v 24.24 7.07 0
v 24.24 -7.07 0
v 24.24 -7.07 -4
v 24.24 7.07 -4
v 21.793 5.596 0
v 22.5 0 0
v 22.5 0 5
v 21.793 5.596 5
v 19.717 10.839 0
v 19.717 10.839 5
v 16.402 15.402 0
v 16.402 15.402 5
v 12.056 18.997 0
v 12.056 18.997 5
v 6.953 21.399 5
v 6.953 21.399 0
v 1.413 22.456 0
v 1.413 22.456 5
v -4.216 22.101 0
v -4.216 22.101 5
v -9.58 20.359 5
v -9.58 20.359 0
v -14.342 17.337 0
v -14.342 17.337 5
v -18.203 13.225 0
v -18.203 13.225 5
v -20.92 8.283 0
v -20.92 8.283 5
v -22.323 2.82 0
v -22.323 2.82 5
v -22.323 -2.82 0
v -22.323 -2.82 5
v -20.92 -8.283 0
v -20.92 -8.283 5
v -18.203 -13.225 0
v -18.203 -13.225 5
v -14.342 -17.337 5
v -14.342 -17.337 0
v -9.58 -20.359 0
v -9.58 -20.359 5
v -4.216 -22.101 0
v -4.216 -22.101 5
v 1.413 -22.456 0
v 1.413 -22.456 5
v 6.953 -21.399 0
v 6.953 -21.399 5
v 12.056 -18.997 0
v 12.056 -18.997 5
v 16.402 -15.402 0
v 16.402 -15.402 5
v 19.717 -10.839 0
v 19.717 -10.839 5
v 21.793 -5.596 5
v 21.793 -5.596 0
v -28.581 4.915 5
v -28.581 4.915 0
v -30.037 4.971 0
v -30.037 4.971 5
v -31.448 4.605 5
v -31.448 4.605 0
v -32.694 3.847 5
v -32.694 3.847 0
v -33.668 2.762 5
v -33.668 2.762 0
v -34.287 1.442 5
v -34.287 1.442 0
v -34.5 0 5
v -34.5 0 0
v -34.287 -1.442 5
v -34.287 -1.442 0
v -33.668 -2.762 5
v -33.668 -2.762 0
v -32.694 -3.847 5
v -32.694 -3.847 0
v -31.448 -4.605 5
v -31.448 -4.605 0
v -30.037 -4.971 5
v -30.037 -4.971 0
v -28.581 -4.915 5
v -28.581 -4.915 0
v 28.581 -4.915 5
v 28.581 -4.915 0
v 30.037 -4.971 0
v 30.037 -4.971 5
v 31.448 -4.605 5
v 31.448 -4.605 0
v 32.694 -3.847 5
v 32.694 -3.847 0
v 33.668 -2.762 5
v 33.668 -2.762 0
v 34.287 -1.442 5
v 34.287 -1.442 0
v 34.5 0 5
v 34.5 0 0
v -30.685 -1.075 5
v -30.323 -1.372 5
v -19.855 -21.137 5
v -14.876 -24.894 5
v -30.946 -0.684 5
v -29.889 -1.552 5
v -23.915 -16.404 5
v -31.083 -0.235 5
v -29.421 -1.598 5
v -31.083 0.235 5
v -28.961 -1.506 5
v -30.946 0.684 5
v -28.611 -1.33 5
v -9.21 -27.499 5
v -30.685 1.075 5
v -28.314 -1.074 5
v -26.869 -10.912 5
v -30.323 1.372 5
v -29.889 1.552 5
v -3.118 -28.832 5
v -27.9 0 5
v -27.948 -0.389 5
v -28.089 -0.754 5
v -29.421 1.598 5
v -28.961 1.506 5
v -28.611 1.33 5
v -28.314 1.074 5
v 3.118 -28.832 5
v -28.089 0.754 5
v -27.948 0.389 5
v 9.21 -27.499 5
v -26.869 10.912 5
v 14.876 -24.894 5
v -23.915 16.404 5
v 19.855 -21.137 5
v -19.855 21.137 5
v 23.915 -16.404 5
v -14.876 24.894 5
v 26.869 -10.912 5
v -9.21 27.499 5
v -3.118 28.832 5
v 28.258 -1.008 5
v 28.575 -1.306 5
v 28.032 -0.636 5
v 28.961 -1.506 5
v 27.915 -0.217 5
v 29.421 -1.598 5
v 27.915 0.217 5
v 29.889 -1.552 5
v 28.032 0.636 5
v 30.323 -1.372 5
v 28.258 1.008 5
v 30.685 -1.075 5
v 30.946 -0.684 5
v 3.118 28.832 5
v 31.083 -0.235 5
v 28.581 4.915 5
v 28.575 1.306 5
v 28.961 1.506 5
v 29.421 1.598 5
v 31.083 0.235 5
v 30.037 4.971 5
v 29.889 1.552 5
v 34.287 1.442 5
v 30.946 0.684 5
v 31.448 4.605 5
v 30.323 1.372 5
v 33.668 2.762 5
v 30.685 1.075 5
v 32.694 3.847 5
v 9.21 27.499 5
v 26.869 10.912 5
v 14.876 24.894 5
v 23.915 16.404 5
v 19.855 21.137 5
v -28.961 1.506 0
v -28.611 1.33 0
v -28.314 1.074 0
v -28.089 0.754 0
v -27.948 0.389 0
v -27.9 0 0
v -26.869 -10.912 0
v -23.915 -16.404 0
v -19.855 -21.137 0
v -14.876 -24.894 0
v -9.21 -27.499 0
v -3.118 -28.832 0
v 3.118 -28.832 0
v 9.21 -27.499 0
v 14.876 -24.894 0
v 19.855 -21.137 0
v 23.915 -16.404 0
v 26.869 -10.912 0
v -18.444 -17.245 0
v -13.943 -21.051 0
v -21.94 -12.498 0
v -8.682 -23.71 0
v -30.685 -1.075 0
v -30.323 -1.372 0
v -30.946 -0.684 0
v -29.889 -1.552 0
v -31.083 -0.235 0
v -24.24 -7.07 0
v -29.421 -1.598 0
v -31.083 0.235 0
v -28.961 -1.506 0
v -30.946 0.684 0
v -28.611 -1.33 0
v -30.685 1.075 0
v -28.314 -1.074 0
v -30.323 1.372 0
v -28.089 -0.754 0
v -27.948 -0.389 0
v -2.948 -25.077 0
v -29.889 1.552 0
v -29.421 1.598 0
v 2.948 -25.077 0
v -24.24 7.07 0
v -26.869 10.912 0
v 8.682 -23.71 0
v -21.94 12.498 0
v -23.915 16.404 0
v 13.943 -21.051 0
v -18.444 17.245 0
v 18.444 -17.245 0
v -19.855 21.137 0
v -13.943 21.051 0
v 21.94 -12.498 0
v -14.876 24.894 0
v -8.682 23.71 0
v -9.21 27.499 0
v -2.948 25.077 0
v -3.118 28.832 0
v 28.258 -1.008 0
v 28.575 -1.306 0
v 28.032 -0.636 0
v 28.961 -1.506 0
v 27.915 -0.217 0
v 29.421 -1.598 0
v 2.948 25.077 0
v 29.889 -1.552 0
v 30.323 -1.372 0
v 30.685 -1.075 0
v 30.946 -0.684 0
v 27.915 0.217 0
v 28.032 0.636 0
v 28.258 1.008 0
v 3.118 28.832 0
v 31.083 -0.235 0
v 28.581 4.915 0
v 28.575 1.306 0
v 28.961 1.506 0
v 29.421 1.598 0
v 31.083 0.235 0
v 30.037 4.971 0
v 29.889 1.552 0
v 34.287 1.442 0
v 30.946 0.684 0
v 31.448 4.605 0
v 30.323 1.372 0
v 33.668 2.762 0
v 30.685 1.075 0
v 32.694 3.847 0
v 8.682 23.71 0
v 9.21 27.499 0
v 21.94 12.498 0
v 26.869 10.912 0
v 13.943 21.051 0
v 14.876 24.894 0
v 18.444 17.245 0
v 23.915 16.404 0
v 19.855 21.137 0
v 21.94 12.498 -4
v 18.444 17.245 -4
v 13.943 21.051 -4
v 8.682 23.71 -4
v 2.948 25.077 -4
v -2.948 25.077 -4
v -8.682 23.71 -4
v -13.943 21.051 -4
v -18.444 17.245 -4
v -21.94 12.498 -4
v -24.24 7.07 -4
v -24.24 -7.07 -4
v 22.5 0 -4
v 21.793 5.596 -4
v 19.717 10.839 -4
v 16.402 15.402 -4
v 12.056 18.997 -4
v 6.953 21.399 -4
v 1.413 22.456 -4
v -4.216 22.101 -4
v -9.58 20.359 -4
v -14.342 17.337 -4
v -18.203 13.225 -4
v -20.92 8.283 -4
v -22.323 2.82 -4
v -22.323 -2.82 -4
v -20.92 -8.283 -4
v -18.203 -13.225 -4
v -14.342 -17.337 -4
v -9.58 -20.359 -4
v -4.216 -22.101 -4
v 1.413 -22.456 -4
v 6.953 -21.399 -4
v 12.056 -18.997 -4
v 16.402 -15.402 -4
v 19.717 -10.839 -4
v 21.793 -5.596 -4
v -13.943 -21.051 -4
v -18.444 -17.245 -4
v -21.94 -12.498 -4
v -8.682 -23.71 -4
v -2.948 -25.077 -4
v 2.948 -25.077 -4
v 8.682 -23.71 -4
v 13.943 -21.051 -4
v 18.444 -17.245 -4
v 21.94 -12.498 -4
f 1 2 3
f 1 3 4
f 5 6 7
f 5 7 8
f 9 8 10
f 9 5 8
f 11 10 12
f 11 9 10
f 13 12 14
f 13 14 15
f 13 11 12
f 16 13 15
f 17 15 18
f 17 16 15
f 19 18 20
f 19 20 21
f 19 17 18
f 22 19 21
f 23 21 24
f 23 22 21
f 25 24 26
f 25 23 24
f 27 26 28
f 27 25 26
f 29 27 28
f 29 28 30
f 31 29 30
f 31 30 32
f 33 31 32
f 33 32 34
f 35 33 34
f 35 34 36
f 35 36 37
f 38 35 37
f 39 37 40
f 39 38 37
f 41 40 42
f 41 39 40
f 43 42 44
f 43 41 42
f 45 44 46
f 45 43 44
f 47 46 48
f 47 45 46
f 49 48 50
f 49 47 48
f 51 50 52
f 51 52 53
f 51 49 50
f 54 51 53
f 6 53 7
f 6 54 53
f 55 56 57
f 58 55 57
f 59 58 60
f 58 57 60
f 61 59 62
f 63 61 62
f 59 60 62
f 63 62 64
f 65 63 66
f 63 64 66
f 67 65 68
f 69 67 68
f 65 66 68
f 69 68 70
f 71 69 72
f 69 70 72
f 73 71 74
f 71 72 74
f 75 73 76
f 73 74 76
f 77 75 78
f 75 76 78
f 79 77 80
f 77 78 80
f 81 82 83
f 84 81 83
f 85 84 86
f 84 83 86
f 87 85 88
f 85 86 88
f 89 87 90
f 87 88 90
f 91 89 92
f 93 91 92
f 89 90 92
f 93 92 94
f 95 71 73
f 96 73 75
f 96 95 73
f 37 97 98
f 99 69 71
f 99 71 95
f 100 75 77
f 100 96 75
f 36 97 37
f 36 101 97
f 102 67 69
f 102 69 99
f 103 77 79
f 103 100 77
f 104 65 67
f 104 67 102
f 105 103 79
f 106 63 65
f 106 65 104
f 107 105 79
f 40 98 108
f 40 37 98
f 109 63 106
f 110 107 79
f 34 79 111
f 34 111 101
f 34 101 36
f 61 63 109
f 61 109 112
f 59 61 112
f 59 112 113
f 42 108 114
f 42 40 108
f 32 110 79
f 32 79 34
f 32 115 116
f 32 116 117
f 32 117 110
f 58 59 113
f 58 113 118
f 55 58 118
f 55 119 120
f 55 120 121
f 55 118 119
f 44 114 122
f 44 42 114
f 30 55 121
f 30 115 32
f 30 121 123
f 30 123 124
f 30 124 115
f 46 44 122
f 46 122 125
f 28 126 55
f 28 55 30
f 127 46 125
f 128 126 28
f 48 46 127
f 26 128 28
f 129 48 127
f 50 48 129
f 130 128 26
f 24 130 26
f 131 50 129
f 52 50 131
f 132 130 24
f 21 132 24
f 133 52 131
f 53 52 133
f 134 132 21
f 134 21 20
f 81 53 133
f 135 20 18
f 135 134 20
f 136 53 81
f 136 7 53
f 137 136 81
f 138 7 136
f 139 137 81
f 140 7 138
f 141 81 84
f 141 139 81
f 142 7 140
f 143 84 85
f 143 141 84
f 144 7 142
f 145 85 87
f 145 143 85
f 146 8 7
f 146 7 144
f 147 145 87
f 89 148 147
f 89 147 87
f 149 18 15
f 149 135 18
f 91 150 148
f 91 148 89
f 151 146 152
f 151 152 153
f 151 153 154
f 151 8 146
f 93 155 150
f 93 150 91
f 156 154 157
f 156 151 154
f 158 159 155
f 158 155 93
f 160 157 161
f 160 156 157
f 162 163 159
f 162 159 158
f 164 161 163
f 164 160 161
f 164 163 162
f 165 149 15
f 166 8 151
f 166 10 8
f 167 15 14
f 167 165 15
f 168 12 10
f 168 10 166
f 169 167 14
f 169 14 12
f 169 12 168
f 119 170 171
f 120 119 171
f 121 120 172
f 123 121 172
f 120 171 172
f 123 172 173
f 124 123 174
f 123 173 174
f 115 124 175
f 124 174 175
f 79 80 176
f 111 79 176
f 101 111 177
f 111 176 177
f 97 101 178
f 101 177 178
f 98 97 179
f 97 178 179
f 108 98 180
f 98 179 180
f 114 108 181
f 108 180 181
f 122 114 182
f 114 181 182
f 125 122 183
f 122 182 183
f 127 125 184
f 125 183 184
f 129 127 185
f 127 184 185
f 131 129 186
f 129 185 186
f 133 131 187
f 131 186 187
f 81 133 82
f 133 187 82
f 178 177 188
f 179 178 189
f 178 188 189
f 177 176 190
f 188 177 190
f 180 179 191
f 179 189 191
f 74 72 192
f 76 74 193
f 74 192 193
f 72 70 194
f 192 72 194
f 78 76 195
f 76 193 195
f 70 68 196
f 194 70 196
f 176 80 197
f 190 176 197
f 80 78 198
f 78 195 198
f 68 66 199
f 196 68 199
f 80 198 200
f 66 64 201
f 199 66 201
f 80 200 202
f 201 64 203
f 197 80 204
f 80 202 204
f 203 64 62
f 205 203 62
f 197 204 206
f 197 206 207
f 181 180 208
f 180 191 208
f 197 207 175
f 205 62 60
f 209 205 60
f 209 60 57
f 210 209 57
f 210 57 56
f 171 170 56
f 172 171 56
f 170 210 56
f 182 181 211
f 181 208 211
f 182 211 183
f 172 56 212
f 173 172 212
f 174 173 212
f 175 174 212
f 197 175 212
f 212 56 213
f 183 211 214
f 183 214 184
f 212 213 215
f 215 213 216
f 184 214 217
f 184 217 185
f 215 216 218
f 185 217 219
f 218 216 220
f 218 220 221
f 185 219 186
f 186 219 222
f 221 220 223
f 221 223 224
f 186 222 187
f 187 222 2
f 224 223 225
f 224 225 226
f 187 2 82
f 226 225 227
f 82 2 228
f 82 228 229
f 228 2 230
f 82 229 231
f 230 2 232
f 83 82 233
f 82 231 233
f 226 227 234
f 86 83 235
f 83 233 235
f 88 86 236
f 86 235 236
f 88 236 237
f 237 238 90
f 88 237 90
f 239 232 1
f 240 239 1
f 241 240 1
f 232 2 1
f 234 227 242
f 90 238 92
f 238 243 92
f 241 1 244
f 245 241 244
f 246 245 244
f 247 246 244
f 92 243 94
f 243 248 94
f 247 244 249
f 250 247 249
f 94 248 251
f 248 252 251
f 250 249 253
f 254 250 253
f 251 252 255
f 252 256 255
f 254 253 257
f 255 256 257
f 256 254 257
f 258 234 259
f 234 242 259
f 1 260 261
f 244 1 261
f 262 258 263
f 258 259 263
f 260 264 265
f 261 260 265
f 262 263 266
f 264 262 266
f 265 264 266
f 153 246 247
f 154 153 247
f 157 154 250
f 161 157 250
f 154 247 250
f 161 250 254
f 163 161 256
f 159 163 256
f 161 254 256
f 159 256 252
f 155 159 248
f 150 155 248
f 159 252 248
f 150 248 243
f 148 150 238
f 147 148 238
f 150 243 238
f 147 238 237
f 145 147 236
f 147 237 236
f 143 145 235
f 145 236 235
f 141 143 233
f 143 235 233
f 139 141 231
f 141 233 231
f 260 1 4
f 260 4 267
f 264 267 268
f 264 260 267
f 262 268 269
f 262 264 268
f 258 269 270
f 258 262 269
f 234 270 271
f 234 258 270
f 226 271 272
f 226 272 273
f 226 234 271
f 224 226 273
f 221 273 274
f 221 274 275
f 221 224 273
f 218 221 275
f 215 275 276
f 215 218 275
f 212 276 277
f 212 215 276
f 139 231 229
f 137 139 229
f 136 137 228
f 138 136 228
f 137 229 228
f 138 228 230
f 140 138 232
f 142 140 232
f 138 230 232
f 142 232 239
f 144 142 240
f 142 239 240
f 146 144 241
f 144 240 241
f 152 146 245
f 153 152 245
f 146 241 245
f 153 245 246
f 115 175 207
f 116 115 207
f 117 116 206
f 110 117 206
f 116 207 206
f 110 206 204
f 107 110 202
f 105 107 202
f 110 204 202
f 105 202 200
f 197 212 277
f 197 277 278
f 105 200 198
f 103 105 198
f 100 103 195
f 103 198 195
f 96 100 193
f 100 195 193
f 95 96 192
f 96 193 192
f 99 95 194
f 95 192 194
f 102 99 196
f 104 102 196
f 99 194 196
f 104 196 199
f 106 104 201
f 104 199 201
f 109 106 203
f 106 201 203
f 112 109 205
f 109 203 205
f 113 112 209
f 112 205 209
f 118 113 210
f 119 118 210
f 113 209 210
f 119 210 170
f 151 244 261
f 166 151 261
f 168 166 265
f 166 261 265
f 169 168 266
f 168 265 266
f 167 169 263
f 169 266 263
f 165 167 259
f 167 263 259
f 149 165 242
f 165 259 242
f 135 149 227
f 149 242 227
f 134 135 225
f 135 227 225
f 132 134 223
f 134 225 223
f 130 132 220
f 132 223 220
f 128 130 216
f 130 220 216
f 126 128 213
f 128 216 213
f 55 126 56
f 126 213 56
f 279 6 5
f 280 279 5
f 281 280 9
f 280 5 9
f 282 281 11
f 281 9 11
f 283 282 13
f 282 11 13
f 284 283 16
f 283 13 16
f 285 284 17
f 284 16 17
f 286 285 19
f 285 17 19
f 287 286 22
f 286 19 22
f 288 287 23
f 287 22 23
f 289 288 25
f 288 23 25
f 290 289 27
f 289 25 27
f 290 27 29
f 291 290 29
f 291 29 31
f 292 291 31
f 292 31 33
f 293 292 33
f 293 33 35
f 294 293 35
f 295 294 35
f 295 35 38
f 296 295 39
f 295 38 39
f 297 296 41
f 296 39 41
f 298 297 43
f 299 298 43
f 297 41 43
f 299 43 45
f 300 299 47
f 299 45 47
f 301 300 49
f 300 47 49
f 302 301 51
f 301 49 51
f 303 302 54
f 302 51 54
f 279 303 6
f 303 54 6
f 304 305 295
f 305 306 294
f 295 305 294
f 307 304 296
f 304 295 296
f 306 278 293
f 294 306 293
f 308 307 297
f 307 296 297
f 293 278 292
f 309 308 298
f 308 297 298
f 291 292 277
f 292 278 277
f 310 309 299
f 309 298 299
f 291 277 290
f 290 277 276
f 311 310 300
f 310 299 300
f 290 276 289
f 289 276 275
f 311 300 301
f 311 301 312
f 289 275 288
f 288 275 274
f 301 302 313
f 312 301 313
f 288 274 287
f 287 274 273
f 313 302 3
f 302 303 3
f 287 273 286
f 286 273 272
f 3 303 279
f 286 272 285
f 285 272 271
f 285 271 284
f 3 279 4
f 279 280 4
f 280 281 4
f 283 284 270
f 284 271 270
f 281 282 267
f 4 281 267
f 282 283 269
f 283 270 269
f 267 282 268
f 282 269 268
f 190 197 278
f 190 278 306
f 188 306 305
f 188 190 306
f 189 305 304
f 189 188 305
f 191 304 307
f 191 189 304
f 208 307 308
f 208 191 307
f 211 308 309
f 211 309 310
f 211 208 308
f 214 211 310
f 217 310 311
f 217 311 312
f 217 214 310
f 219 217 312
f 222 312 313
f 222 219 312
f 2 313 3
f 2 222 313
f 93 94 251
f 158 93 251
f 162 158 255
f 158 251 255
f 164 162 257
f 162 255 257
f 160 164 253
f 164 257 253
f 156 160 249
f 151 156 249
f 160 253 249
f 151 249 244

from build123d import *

# Parameters (mm, degrees)
F0_R     = 22.5
F1_DEPTH = 5
F2_DEPTH = 4


# Not quite as in the source:
# - a feature names something its author has since deleted; it is built from what else it names


with BuildPart() as f1:
    # F0 (on Top) → F1 (new body)
    with BuildSketch(Plane.XY):
        with BuildLine():
            ThreePointArc((28.5805084746, -4.9147263743), (24.5, 0), (28.5805084746, 4.9147263743))
            ThreePointArc((28.5805084746, 4.9147263743), (0, 29), (-28.5805084746, 4.9147263743))
            ThreePointArc((-28.5805084746, 4.9147263743), (-25.6530884058, 3.1939428903), (-24.5, 0))
            ThreePointArc((-24.5, 0), (-25.6530884058, -3.1939428903), (-28.5805084746, -4.9147263743))
            ThreePointArc((-28.5805084746, -4.9147263743), (0, -29), (28.5805084746, -4.9147263743))
        make_face()
        with BuildLine():
            ThreePointArc((-24.24, 7.07), (0, 25.25), (24.24, 7.07))
            Line((24.24, 7.07), (24.24, -7.07))
            ThreePointArc((24.24, -7.07), (0, -25.25), (-24.24, -7.07))
            Line((-24.24, -7.07), (-24.24, 7.07))
        make_face(mode=Mode.SUBTRACT)
        with BuildLine():
            Line((24.24, -7.07), (24.24, 7.07))
            ThreePointArc((24.24, 7.07), (0, 25.25), (-24.24, 7.07))
            Line((-24.24, 7.07), (-24.24, -7.07))
            ThreePointArc((-24.24, -7.07), (0, -25.25), (24.24, -7.07))
        make_face()
        Circle(F0_R, mode=Mode.SUBTRACT)
        with BuildLine():
            ThreePointArc((-28.9608474576, 1.506424421), (-28.8211040937, 3.2162025464), (-28.5805084746, 4.9147263743))
            ThreePointArc((-28.5805084746, 4.9147263743), (-34.5, 0), (-28.5805084746, -4.9147263743))
            ThreePointArc((-28.5805084746, -4.9147263743), (-28.8211040937, -3.2162025464), (-28.9608474576, -1.506424421))
            ThreePointArc((-28.9608474576, -1.506424421), (-31.1, 0), (-28.9608474576, 1.506424421))
        make_face()
        with BuildLine():
            ThreePointArc((28.5805084746, 4.9147263743), (28.8211040937, 3.2162025464), (28.9608474576, 1.506424421))
            ThreePointArc((28.9608474576, 1.506424421), (30.4212371932, 1.3081750777), (31.1, 0))
            ThreePointArc((31.1, 0), (30.4212371932, -1.3081750777), (28.9608474576, -1.506424421))
            ThreePointArc((28.9608474576, -1.506424421), (28.8211040937, -3.2162025464), (28.5805084746, -4.9147263743))
            ThreePointArc((28.5805084746, -4.9147263743), (32.6939428903, -3.8469115942), (34.5, 0))
            ThreePointArc((34.5, 0), (32.6939428903, 3.8469115942), (28.5805084746, 4.9147263743))
        make_face()
        with BuildLine():
            ThreePointArc((-24.5, 0), (-25.6530884058, 3.1939428903), (-28.5805084746, 4.9147263743))
            ThreePointArc((-28.5805084746, 4.9147263743), (-28.8211040937, 3.2162025464), (-28.9608474576, 1.506424421))
            ThreePointArc((-28.9608474576, 1.506424421), (-28.1918249223, 0.9212371932), (-27.9, 0))
            ThreePointArc((-27.9, 0), (-28.1918249223, -0.9212371932), (-28.9608474576, -1.506424421))
            ThreePointArc((-28.9608474576, -1.506424421), (-28.8211040937, -3.2162025464), (-28.5805084746, -4.9147263743))
            ThreePointArc((-28.5805084746, -4.9147263743), (-25.6530884058, -3.1939428903), (-24.5, 0))
        make_face()
        with BuildLine():
            ThreePointArc((28.9608474576, -1.506424421), (27.9, 0), (28.9608474576, 1.506424421))
            ThreePointArc((28.9608474576, 1.506424421), (28.8211040937, 3.2162025464), (28.5805084746, 4.9147263743))
            ThreePointArc((28.5805084746, 4.9147263743), (24.5, 0), (28.5805084746, -4.9147263743))
            ThreePointArc((28.5805084746, -4.9147263743), (28.8211040937, -3.2162025464), (28.9608474576, -1.506424421))
        make_face()
    extrude(amount=F1_DEPTH)

    # F0 (on Top) → F2 (join)
    with BuildSketch(Plane.XY):
        with BuildLine():
            Line((24.24, -7.07), (24.24, 7.07))
            ThreePointArc((24.24, 7.07), (0, 25.25), (-24.24, 7.07))
            Line((-24.24, 7.07), (-24.24, -7.07))
            ThreePointArc((-24.24, -7.07), (0, -25.25), (24.24, -7.07))
        make_face()
        Circle(F0_R, mode=Mode.SUBTRACT)
    extrude(amount=-F2_DEPTH)


solid = f1.part
